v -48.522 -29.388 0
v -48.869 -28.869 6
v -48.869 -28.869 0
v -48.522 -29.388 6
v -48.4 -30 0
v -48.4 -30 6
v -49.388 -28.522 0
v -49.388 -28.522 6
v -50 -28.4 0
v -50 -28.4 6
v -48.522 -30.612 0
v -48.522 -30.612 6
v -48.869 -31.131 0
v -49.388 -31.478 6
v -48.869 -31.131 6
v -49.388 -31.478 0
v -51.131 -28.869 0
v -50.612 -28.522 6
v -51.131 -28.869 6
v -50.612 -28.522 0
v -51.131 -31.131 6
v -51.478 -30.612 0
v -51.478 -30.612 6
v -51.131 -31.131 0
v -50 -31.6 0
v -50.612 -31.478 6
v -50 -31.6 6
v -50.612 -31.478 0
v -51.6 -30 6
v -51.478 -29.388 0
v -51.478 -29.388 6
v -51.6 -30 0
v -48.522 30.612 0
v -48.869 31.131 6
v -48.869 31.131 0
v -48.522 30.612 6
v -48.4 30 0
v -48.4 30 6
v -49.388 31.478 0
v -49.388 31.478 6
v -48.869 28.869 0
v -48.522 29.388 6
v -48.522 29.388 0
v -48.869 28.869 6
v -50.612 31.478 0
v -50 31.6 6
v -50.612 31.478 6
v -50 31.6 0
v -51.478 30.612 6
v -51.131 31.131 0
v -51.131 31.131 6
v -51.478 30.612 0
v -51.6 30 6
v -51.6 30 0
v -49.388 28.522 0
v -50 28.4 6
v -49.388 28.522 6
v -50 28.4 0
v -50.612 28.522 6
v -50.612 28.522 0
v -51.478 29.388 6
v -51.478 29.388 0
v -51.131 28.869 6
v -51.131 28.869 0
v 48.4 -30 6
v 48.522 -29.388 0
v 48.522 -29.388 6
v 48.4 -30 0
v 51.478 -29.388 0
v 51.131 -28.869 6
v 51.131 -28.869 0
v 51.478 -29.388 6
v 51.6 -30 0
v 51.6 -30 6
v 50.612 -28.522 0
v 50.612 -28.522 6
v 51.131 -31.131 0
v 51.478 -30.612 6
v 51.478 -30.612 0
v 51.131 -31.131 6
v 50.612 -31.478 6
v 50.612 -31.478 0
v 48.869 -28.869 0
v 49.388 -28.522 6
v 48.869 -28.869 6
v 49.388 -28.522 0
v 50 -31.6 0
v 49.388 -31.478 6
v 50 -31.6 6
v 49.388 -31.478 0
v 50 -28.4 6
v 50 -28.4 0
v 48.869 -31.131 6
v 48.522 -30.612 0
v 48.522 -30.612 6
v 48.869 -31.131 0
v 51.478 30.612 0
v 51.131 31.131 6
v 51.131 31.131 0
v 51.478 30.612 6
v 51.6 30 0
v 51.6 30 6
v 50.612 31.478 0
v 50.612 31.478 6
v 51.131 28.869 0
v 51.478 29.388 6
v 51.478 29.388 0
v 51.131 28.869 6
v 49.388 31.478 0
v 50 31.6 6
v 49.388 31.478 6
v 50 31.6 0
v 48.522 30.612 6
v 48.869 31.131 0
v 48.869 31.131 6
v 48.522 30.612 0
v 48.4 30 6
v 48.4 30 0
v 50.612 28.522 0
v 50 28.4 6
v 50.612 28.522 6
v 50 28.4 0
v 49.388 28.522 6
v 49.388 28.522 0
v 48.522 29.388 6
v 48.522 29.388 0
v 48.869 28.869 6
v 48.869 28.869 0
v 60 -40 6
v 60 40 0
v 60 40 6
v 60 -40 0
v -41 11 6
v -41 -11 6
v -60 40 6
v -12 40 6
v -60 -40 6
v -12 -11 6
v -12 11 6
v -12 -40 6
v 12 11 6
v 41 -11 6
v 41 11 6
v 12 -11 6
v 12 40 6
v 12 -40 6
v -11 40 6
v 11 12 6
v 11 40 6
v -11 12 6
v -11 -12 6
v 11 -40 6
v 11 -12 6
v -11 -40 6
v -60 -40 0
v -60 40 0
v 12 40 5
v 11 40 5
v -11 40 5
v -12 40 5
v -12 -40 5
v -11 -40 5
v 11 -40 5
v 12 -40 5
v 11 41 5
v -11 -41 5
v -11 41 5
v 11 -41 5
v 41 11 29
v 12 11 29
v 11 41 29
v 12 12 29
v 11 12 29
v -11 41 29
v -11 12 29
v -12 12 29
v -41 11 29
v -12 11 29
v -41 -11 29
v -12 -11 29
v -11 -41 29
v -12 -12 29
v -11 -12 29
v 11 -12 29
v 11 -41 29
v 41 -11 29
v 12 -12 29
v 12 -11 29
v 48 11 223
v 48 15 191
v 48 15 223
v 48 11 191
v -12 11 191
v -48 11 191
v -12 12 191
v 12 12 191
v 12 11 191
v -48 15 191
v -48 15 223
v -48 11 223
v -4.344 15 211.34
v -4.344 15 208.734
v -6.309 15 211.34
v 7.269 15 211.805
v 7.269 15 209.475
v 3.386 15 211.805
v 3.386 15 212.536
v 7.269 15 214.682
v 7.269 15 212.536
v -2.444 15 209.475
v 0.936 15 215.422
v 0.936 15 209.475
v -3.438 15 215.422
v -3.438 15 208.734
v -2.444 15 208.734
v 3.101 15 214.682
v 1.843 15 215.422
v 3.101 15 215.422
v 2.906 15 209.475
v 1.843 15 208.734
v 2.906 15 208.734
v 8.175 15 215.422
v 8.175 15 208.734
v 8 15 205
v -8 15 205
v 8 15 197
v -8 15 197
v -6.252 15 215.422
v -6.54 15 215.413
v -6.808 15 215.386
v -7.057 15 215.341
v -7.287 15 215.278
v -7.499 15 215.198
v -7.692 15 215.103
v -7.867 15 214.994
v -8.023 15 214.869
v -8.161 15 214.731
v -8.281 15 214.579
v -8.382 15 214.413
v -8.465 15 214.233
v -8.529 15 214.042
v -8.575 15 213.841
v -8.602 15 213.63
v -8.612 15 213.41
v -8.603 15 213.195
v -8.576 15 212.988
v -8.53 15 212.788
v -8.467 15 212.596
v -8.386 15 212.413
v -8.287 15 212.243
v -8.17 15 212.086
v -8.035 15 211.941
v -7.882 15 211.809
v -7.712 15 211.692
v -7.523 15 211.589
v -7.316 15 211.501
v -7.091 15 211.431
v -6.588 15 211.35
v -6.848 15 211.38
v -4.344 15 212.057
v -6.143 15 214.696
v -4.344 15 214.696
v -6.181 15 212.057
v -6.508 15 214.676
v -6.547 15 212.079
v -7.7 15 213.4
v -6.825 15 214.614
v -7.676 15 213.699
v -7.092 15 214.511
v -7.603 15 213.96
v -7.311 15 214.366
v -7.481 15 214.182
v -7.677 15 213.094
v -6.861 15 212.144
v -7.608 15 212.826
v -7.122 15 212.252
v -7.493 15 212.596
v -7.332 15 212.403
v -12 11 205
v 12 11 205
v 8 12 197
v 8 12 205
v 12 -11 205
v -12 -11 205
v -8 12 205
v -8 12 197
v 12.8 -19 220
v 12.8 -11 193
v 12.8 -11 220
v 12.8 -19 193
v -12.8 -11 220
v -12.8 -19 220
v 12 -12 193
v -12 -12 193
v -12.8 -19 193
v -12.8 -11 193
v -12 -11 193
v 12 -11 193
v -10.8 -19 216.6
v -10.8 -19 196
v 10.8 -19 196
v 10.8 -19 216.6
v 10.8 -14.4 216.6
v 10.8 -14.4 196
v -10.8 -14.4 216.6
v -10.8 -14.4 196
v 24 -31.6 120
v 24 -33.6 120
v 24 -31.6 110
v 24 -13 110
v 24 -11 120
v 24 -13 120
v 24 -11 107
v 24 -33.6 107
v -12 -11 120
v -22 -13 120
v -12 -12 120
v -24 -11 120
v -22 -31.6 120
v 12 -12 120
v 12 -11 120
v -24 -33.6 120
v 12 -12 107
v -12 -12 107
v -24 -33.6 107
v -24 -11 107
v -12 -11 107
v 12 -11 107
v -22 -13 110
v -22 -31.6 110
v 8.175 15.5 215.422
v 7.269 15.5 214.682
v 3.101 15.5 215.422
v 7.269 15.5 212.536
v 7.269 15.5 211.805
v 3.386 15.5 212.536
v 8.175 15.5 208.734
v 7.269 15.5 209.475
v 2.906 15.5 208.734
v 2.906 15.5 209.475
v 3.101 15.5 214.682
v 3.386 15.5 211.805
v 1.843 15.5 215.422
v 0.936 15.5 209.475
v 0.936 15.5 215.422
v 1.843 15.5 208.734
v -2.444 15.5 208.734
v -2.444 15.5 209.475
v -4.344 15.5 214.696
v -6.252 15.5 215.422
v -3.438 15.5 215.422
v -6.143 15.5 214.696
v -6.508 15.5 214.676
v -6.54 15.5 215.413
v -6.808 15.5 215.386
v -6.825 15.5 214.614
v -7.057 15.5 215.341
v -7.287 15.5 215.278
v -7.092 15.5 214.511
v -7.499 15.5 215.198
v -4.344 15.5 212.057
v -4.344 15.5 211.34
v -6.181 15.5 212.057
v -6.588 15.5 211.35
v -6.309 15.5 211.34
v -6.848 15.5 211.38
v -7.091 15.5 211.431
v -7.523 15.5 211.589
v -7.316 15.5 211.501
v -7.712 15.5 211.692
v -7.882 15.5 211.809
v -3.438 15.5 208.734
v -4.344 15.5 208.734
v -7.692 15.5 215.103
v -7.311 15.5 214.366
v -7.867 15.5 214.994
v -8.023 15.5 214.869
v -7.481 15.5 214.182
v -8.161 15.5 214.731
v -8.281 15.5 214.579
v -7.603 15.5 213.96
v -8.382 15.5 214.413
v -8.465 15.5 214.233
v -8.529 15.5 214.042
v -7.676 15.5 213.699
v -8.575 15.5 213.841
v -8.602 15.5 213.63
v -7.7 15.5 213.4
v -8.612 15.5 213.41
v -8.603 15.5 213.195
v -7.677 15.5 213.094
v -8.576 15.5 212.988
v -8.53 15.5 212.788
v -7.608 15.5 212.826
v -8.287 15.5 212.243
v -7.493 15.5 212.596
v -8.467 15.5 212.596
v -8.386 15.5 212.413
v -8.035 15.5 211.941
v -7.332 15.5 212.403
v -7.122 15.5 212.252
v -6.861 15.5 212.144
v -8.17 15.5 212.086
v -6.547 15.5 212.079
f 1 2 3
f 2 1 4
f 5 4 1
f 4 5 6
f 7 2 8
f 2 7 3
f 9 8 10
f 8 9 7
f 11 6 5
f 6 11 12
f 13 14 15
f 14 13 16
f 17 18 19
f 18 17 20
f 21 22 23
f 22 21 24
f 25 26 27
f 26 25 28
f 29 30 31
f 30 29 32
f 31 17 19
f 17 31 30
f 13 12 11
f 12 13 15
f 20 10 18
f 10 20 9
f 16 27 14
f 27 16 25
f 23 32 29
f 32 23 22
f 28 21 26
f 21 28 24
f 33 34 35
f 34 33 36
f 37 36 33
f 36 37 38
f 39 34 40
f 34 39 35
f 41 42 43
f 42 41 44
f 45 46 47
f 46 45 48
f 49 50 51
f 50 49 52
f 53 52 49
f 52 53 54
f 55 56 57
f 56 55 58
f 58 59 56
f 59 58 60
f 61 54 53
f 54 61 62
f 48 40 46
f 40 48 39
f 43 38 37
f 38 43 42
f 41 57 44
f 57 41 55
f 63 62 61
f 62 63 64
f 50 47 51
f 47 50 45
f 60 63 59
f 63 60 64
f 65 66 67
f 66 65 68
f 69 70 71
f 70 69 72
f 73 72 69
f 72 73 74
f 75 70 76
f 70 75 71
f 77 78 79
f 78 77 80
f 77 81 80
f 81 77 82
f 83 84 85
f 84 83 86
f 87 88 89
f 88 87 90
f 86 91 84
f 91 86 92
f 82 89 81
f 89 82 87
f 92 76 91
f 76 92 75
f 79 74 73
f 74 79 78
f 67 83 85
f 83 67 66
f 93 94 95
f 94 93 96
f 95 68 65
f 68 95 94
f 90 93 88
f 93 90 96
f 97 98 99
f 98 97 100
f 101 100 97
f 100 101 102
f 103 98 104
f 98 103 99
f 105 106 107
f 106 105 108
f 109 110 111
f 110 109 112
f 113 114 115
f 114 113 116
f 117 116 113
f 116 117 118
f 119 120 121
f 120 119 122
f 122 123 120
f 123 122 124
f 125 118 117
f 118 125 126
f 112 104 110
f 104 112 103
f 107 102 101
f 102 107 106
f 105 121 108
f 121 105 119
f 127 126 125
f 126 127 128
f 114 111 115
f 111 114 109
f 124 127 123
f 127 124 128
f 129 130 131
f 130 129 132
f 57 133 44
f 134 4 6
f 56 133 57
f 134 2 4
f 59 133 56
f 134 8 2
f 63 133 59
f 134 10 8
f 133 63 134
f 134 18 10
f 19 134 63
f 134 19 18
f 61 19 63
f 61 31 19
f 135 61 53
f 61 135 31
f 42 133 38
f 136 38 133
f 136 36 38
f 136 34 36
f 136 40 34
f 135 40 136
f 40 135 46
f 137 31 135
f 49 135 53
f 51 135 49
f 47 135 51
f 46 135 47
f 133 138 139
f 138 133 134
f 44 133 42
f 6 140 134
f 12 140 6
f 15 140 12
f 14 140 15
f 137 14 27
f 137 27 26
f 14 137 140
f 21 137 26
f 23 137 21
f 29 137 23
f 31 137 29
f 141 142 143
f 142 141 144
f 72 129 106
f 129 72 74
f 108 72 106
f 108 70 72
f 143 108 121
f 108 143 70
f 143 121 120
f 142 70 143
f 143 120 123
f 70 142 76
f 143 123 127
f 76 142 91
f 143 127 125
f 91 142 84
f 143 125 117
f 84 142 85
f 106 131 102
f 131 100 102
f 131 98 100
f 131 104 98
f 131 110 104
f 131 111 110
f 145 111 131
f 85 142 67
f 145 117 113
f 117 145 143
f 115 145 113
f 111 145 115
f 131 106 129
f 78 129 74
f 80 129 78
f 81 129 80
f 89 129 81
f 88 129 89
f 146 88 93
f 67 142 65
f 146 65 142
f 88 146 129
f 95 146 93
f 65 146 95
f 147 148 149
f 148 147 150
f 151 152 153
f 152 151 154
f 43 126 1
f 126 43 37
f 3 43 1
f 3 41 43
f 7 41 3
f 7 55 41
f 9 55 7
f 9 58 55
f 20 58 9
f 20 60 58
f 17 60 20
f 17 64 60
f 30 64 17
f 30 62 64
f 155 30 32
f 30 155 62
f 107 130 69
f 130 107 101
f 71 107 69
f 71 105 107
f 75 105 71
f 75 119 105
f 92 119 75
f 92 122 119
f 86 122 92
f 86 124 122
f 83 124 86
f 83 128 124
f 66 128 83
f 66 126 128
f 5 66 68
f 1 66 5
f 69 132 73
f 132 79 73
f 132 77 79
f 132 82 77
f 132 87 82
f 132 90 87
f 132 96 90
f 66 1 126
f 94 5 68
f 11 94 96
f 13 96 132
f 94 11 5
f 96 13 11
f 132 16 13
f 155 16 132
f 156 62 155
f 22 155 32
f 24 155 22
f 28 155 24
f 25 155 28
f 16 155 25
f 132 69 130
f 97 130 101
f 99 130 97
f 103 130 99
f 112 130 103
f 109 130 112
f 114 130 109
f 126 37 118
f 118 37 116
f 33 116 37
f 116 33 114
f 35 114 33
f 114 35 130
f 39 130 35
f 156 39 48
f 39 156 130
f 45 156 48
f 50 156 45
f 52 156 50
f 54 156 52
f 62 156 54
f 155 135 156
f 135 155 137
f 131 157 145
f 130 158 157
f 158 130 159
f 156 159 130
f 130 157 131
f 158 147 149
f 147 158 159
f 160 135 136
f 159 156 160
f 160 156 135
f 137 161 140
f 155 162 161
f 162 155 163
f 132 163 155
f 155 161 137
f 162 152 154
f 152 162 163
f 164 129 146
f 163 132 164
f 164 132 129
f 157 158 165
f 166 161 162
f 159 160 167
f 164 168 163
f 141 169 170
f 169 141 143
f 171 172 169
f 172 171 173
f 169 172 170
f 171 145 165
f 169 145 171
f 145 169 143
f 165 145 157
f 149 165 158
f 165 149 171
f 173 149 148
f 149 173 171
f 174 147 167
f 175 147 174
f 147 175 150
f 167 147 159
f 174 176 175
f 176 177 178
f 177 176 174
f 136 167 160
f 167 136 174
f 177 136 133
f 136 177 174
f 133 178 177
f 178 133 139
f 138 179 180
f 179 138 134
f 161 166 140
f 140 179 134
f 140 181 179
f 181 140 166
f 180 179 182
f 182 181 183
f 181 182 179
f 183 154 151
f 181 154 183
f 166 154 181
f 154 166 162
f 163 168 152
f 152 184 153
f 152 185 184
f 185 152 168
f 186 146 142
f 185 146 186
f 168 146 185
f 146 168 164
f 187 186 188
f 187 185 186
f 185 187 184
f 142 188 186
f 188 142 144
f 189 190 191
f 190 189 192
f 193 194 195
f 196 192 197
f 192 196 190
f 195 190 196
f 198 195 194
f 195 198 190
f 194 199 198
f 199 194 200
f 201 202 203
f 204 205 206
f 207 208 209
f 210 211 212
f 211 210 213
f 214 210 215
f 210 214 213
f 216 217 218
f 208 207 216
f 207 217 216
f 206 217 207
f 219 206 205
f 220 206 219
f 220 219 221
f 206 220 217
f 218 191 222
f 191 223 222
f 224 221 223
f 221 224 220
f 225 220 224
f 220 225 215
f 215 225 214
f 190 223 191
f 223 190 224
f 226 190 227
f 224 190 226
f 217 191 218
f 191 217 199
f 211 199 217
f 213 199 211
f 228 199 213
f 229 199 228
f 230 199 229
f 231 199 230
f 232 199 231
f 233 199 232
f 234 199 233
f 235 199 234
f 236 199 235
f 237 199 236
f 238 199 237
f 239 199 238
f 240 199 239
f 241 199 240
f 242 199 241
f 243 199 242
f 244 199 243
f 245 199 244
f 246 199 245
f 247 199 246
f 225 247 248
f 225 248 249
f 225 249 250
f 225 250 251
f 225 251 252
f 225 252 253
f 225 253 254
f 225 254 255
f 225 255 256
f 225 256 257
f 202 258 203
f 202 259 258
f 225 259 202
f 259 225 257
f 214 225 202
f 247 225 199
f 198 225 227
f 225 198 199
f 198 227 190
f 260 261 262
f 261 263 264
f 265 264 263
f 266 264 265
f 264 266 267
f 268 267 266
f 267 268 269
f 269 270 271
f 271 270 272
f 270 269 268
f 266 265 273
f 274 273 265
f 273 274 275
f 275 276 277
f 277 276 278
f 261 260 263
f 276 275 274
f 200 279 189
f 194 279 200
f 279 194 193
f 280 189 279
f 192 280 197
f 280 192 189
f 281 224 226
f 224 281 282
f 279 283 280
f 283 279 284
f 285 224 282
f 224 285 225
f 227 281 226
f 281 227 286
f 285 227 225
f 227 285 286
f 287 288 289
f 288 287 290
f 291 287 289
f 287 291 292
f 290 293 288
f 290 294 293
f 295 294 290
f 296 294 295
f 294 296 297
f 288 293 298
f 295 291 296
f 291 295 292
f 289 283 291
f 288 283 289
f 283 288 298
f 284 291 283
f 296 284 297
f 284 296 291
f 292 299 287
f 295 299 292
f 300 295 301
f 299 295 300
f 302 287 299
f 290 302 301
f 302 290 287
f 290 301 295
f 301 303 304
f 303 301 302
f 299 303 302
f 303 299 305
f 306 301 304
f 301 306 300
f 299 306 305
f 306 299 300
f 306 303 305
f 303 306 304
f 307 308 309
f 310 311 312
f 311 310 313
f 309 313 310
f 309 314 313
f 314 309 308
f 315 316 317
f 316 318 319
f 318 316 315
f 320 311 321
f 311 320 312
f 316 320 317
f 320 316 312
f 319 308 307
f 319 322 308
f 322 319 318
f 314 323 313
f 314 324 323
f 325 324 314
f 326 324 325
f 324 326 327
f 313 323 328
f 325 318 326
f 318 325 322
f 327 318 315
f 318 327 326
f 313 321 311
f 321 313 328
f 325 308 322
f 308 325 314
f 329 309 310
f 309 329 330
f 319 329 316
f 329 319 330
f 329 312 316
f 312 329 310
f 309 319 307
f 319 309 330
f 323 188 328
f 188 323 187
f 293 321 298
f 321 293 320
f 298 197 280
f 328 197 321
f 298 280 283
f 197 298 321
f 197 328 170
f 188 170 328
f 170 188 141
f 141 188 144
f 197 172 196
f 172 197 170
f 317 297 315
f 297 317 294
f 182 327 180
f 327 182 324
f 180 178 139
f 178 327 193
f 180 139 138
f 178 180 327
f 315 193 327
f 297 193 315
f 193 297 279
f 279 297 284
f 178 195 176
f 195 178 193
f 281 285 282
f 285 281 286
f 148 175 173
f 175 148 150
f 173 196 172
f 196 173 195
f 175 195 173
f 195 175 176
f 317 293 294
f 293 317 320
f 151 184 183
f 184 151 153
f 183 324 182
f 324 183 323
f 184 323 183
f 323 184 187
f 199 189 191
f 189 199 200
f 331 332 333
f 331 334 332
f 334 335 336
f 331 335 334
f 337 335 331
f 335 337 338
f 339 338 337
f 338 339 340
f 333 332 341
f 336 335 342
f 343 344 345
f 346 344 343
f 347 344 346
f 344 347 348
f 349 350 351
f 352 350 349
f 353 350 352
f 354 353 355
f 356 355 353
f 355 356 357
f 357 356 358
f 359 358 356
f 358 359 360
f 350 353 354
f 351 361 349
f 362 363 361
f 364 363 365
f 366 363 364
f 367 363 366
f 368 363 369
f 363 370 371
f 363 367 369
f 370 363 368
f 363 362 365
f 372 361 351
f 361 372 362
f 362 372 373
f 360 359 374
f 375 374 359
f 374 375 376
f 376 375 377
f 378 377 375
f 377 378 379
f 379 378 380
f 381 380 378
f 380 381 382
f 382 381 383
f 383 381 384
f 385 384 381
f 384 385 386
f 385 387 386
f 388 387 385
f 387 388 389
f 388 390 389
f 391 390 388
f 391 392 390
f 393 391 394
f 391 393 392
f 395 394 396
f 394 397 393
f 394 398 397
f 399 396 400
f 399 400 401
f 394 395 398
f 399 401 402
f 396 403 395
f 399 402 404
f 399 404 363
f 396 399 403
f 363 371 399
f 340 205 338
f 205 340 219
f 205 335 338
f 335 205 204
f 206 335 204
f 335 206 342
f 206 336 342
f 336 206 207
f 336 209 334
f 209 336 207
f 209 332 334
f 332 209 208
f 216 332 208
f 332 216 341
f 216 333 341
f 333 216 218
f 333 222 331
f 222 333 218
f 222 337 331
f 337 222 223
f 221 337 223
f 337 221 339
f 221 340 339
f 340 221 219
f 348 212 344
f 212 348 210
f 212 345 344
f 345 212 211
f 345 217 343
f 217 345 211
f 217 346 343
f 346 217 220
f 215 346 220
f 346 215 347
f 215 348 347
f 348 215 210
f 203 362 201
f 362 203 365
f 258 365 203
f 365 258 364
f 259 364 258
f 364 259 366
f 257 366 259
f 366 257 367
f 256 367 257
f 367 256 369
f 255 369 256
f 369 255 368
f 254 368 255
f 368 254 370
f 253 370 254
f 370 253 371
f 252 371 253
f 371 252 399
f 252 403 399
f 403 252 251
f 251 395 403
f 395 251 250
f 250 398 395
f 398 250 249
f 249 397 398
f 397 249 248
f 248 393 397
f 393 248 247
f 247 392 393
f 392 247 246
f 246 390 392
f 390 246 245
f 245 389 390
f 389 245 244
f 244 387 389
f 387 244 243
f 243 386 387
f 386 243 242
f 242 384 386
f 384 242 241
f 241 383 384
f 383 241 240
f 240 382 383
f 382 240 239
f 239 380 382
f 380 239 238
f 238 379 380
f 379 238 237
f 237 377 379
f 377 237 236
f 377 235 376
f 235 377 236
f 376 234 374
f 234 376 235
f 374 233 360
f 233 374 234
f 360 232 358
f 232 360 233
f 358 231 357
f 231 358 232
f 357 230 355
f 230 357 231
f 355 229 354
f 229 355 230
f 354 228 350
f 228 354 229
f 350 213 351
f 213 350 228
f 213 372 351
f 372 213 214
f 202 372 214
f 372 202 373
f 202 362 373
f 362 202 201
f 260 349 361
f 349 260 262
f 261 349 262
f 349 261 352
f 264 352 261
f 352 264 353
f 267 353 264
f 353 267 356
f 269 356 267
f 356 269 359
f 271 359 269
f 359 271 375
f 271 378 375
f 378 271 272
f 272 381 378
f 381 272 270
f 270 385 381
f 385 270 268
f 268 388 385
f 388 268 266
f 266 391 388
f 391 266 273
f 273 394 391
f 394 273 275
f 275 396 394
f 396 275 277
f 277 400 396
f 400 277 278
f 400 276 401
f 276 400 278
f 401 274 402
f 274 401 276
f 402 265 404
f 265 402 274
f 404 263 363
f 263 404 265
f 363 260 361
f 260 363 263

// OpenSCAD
// VIO stand - SIMPLE (v5)
// ELP front, lens 200mm up | Nano + HW290 stacked on mast REAR
// Nano: open-top + open-end box (drop/slide in, USB free, no label)
// HW290 21x20: lidded pocket, slides in from +X side, wire notch rear

cam_w = 80; cam_h = 16.5; cam_thick = 8; baseline = 60; lens_d = 14;
nano_l = 43.2; nano_w = 17.8; nano_thick = 5;
imu_w = 21; imu_l = 20; imu_thick = 4;

base_l = 120; base_w = 80; base_t = 6;
mast_w = 24; mast_d = 24; cam_z = 200;
ghosts = true;
$fn = 24;

// --- base ---
difference() {
    translate([-base_l/2, -base_w/2, 0]) cube([base_l, base_w, base_t]);
    for (x=[-1,1], y=[-1,1])
        translate([x*(base_l/2-10), y*(base_w/2-10), -1])
            cylinder(d=3.2, h=base_t+2, $fn=16);
}

// --- mast + gussets ---
translate([-mast_w/2, -mast_d/2, base_t-1])
    cube([mast_w, mast_d, cam_z]);
for (r=[0,90,180,270]) rotate([0,0,r])
    translate([mast_w/2-1, mast_d/2-1, base_t-1])
        linear_extrude(mast_w) polygon([[0,0],[0,30],[30,0]]);

// --- camera mount (front) ---
// AGENT: ELP 3DGS1200P01 stereo mounts HERE. Lens optical centers (rig frame,
// mm, X right / Y forward / Z up, origin base center): LEFT (-30, 15, 206),
// RIGHT (+30, 15, 206). baseline=60 (line 6), lens plane y = cam_plate_y+4,
// height z = base_t+cam_z. Plate 96 wide, lens cutouts d=lens_d+1.5, USB slot
// center, 2x M2 holes at x=+-34. See CALIB block at file end for extrinsics.
cam_plate_y = mast_d/2 - 1;
difference() {
    translate([-48, cam_plate_y, base_t+cam_z-15])
        cube([96, 4, 30]);
    for (s=[-1,1])
        translate([s*baseline/2, cam_plate_y-1, base_t+cam_z])
            rotate([90,0,0]) cylinder(d=lens_d+1.5, h=6, $fn=32);
    translate([-8, cam_plate_y-1, base_t+cam_z-9])
        cube([16, 6, 8]);
    for (s=[-1,1])
        translate([s*34, cam_plate_y-1, base_t+cam_z-7])
            rotate([90,0,0]) cylinder(d=2.2, h=6, $fn=12);
}
translate([-48, cam_plate_y, base_t+cam_z+13]) cube([96, 4, 4]);
if (ghosts)
    %color("deepskyblue", 0.45)
        translate([-cam_w/2, cam_plate_y+4, base_t+cam_z-8])
            cube([cam_w, cam_thick, cam_h]);

// --- HW290 BOX (rear, level with camera): lidded pocket, REAR entry ---
// AGENT: HW290 IMU (21 x 20 x 4mm incl. pin connector) mounts HERE. Board
// seats pushed fully forward: center (0, -16.7, 206), plane vertical facing
// rear, 21mm edge along X. Pocket = board + fit*2 per side (fit line ~54).
// Open full-width rear slot (push in from behind), 3mm lid on top, +X side
// closed, I2C leads exit the rear slot. Lever arm to lenses in CALIB block
// at file end. Rotation R_imu_cam is NOT constrained by this pocket: it
// depends on ICM-20689 die orientation on the breakout + insert pose.
// top COVERED, +X side CLOSED, full-width rear slot: push board
// straight in from behind, I2C leads exit the same rear slot
// Push-fit: 0.3mm/side clearance on 21 x 20 x 4 board (tune `fit` if needed)
fit = 0.3;
imu_slot_x = imu_w + fit*2;       // 21.6
imu_slot_y = imu_thick + fit*2;   // 4.6
imu_slot_z = imu_l + fit*2;       // 20.6
imu_floor = base_t+cam_z-10;      // 196
imu_rim = imu_floor + 24;         // 220 outer top
echo(str("HW290 pocket: ", imu_slot_x, " x ", imu_slot_y, " x ", imu_slot_z,
         " for board ", imu_w, " x ", imu_thick, " x ", imu_l));
difference() {
    // outer: slot + 2mm walls, 3mm floor/lid, fused into mast
    translate([-(imu_slot_x/2+2), -mast_d/2-7, imu_floor-3])
        cube([imu_slot_x+4, imu_slot_y+3.4, 27]);
    // interior slot, open through entire rear face, lid on top
    translate([-imu_slot_x/2, -mast_d/2-7, imu_floor])
        cube([imu_slot_x, imu_slot_y, imu_slot_z]);
}
if (ghosts)
    %color("orange", 0.55)
        translate([-imu_w/2, -mast_d/2-7+fit, imu_floor])
            cube([imu_w, imu_thick, imu_l]);

// --- NANO BOX (rear, halfway up): open roof + open +X end ---
// floor + walls only, board drops in from top or slides from end
nano_z0 = 107;   // floor bottom, walls to 120
difference() {
    // outer 48 x 22.6 x 13, back embedded 1mm into mast
    translate([-24, -mast_d/2-21.6, nano_z0]) cube([48, 22.6, 13]);
    // interior 44 x 18.6, open through top (+roof) and +X end
    translate([-22, -mast_d/2-19.6, nano_z0+3]) cube([47, 18.6, 11]);
}
if (ghosts)
    %color("limegreen", 0.5)
        translate([-nano_l/2, -mast_d/2-19.2, nano_z0+3])
            cube([nano_l, nano_w, nano_thick]);

// --- label: ELP only ---
translate([0, 15.5, 212]) rotate([90,0,0]) mirror([1,0,0])
    linear_extrude(1.5) text("ELP", size=7, halign="center", valign="center");

// === CALIB: single source of truth for camera-IMU extrinsics ===
// Rig frame: X right, Y forward (lens look dir), Z up, origin at base center.
// Optical frame (cam0/cam1): x right, y DOWN, z forward.
// p_opt = [dx_rig, -dz_rig, dy_rig]. Units below in METERS for Kalibr/OpenVINS.
// NOTE: translation below is exact from CAD. Rotation R_imu_cam is NOT in
// CAD (depends on ICM-20689 die orientation on YOUR breakout + insert pose):
// carry over the old R only if chip orientation vs camera is unchanged,
// else re-run hw290_stereo/calibrate_rotation.py. Time offset keep 0.02.
lens_y = cam_plate_y + 4;          // lens plane (plate front)
lens_z = base_t + cam_z;           // 206mm above z=0
imu_cx = 0;
imu_cy = -mast_d/2 - 7 + fit + imu_thick/2;  // board pushed fully in
imu_cz = imu_floor + imu_l/2;
cam0_p = [imu_cx - (-baseline/2), -(imu_cz - lens_z), (imu_cy - lens_y)] / 1000;
cam1_p = [imu_cx - (baseline/2),  -(imu_cz - lens_z), (imu_cy - lens_y)] / 1000;
echo(str("CALIB baseline_m: ", baseline/1000));
echo(str("CALIB p_IMU_in_cam0_m: ", cam0_p));
echo(str("CALIB p_IMU_in_cam1_m: ", cam1_p));
echo("CALIB rotation: reuse old R_imu_cam iff chip orientation unchanged, else recalibrate; timeshift keep 0.02");
